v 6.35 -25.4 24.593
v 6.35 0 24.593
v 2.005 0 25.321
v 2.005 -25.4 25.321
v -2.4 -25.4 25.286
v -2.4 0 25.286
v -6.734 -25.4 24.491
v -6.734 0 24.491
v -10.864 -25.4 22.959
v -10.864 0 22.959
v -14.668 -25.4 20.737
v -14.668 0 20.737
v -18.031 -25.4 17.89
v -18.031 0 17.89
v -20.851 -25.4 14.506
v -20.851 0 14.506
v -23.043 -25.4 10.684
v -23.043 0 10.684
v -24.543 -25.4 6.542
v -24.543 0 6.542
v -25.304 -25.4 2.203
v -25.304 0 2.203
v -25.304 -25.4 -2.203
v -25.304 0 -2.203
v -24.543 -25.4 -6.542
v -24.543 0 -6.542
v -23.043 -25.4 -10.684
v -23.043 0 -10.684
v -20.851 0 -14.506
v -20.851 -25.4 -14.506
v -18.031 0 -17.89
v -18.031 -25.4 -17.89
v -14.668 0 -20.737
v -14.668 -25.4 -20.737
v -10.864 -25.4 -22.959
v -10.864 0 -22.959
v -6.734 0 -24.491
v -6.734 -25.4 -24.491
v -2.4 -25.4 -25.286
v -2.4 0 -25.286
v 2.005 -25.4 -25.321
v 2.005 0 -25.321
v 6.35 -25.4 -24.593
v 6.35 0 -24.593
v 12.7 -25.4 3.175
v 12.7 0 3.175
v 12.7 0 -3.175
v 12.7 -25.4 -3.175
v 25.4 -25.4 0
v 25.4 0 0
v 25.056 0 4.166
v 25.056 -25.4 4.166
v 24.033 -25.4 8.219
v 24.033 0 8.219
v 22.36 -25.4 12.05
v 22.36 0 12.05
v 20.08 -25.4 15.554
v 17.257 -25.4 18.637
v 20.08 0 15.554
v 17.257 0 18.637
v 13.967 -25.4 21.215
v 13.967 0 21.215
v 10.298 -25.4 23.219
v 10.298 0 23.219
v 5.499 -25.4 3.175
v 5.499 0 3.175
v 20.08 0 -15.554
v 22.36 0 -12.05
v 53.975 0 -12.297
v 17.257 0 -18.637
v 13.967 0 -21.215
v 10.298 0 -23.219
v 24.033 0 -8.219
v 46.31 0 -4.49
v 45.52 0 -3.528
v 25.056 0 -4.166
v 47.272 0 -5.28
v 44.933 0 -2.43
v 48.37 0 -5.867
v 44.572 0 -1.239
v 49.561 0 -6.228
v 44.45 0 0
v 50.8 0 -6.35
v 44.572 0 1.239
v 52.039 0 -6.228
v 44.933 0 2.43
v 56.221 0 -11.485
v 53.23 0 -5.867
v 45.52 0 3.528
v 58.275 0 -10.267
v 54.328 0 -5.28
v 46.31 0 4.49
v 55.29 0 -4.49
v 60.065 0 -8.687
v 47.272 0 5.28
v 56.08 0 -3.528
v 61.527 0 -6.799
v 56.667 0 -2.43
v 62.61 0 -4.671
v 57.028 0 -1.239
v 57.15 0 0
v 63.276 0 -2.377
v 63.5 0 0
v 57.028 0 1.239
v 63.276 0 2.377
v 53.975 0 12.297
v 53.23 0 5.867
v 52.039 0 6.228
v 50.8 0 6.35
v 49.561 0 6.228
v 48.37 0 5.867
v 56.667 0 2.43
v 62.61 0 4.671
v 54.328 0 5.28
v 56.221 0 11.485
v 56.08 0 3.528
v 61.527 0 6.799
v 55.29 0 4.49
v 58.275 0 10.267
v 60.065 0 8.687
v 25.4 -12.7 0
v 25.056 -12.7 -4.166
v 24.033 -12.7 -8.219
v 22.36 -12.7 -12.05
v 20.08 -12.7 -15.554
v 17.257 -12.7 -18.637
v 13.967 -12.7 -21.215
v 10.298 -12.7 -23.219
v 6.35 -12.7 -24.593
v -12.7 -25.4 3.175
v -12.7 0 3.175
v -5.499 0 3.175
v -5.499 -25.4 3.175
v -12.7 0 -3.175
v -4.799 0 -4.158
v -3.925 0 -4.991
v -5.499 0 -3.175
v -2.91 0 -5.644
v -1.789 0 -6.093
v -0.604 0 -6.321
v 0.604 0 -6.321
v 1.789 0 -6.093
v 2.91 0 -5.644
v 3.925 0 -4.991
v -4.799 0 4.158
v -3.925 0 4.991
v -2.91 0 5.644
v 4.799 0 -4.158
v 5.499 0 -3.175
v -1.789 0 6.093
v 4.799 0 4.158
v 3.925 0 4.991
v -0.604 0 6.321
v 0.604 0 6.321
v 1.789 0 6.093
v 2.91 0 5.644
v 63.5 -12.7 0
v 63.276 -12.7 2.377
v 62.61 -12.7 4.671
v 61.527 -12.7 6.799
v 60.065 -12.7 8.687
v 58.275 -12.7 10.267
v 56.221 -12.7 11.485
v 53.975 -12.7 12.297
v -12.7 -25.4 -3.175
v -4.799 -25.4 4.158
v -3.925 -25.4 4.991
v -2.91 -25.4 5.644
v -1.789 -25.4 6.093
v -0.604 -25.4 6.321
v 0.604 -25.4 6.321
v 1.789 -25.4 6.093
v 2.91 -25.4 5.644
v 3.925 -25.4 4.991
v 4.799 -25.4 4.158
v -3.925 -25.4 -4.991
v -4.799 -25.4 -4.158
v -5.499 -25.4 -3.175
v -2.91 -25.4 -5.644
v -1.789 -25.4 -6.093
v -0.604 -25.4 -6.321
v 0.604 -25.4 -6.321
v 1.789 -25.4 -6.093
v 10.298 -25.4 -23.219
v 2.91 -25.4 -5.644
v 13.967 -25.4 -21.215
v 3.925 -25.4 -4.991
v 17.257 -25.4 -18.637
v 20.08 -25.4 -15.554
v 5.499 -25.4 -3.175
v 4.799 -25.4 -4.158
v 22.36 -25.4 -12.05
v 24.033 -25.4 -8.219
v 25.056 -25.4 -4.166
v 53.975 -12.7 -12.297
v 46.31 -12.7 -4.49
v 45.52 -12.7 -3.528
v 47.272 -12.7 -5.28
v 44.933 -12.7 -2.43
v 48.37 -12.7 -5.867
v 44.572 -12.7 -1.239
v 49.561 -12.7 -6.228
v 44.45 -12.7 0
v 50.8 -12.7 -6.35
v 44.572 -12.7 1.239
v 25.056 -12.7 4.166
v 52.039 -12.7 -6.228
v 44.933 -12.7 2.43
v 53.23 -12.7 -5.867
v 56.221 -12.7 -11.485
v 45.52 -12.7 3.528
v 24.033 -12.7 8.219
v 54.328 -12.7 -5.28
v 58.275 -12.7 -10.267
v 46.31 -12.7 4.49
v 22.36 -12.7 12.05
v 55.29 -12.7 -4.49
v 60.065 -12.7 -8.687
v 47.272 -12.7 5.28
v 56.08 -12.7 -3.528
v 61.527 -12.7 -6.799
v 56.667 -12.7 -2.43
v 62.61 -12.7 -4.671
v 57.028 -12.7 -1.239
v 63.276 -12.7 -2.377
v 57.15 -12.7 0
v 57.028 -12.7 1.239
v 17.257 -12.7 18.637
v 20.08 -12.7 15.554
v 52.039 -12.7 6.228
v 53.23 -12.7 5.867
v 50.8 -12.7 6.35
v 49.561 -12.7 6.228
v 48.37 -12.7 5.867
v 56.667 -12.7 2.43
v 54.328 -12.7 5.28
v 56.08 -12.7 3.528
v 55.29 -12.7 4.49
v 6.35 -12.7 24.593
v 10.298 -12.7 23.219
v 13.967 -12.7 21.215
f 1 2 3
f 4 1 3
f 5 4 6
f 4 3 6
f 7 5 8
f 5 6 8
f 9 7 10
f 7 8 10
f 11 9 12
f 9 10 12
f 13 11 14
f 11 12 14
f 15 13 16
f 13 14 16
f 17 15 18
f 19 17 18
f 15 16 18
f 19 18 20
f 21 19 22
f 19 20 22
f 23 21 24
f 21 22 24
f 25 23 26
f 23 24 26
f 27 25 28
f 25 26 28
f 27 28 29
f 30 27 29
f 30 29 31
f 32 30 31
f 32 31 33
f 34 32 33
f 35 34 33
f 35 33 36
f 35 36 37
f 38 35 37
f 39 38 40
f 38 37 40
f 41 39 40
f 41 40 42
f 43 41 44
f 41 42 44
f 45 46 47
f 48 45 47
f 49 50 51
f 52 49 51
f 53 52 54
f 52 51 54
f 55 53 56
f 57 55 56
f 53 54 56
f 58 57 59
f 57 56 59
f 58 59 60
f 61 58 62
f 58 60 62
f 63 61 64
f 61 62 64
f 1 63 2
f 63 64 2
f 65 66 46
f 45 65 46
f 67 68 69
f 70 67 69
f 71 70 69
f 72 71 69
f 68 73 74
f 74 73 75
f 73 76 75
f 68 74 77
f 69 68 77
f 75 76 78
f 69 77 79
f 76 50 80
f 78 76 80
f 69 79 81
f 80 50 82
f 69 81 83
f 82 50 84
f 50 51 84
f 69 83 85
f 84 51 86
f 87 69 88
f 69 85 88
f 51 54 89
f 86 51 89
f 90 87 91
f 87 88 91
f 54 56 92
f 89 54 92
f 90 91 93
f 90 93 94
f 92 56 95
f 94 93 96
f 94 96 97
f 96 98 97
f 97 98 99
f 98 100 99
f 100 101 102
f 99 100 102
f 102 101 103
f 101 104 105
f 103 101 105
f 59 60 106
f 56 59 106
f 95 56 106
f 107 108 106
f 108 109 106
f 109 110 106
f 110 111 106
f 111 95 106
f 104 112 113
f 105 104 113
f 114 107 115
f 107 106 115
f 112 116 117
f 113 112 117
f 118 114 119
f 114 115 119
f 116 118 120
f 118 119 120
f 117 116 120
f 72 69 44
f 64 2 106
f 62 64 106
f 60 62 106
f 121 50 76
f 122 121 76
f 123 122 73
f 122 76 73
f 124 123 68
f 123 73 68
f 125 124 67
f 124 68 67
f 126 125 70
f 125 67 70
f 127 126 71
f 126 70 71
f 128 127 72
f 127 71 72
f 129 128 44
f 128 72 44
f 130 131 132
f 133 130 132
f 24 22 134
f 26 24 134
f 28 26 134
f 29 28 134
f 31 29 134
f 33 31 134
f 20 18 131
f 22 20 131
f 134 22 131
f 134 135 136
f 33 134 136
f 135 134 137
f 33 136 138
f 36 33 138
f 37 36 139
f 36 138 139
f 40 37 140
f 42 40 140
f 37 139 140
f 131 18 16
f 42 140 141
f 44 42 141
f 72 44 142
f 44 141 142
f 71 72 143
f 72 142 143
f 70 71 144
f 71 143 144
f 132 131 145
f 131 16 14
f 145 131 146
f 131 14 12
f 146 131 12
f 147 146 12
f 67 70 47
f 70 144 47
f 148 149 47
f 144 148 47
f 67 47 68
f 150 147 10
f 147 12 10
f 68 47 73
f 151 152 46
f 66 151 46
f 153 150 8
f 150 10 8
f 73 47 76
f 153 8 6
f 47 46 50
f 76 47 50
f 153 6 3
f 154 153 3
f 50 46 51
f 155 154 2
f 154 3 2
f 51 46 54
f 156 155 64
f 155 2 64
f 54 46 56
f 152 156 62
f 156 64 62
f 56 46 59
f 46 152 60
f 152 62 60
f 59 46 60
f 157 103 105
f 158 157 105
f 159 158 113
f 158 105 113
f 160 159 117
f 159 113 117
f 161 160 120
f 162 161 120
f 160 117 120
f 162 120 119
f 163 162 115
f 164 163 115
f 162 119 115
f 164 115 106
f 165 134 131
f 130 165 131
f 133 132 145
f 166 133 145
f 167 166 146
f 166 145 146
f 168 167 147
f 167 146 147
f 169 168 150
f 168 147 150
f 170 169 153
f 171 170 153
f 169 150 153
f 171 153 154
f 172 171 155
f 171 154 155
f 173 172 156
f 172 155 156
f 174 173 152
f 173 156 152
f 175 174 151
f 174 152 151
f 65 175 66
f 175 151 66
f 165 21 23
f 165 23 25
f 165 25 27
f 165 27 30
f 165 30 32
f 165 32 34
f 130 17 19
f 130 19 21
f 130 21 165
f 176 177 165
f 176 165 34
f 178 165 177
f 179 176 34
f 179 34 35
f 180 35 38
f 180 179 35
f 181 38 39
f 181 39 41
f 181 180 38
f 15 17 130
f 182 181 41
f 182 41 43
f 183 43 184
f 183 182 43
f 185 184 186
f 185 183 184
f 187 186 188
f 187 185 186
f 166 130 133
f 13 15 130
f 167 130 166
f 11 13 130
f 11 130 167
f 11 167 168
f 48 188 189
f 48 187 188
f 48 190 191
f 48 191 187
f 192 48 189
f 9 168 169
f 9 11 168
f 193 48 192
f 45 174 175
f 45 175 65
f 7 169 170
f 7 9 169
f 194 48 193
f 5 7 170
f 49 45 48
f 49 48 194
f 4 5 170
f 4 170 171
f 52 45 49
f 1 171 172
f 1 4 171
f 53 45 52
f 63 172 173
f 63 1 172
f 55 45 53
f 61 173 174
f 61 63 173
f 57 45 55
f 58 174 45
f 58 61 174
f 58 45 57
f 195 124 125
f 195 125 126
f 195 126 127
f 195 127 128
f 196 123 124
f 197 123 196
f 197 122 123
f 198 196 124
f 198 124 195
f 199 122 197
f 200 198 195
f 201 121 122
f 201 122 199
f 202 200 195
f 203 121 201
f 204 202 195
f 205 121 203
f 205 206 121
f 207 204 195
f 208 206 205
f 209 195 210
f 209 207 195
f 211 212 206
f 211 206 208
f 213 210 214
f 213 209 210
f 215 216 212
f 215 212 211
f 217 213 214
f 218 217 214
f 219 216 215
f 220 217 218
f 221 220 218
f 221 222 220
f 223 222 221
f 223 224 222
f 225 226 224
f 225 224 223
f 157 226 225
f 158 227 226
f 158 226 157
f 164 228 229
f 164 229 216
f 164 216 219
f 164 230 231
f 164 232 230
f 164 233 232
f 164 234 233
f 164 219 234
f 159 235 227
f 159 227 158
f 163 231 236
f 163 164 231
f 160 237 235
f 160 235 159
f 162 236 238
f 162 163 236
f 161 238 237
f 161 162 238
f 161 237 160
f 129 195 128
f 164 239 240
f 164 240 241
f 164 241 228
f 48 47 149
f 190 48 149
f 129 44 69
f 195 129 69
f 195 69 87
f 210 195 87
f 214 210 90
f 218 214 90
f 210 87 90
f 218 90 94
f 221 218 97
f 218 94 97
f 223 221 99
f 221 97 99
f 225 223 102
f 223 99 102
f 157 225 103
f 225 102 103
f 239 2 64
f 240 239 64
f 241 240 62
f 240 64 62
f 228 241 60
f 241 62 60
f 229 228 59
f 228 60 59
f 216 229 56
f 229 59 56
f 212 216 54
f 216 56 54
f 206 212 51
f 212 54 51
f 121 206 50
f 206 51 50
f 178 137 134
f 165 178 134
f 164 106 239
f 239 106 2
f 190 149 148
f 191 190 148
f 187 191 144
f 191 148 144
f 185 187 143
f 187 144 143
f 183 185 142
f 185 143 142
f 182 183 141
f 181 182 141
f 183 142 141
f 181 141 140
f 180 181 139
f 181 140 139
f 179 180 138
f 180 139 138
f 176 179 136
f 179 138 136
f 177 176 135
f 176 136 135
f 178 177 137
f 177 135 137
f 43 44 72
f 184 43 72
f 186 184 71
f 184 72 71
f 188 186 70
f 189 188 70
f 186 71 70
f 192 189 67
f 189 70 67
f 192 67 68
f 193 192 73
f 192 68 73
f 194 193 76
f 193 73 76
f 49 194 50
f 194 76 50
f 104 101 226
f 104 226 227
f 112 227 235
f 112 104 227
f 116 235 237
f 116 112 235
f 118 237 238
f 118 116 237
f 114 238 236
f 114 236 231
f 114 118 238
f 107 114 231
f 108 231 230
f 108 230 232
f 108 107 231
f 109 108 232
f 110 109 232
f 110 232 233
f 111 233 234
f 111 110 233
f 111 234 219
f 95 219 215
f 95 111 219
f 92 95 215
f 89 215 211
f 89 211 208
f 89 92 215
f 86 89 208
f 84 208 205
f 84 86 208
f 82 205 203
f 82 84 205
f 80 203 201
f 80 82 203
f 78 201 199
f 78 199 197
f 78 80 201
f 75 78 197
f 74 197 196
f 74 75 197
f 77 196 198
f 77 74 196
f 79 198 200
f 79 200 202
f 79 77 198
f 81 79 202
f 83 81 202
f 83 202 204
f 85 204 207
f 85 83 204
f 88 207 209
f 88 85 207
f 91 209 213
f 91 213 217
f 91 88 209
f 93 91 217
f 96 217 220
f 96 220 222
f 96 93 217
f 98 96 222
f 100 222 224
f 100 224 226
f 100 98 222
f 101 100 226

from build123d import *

# Parameters (mm, degrees)
F1_DEPTH = 25.4
F0_R     = 6.35
F2_DEPTH = 12.7


with BuildPart() as f1:
    # F0 (on Front) → F1 (new body)
    with BuildSketch(Plane.XZ):
        with BuildLine():
            ThreePointArc((6.35, -24.593444), (20.080463, -15.55426), (25.4, 0))
            ThreePointArc((25.4, 0), (20.080463, 15.55426), (6.35, 24.593444))
            ThreePointArc((6.35, 24.593444), (-25.4, 0), (6.35, -24.593444))
        make_face()
        with BuildLine():
            ThreePointArc((-5.499261, 3.175), (0, 6.35), (5.499261, 3.175))
            Line((5.499261, 3.175), (12.7, 3.175))
            Line((12.7, 3.175), (12.7, -3.175))
            Line((12.7, -3.175), (5.499261, -3.175))
            ThreePointArc((5.499261, -3.175), (0, -6.35), (-5.499261, -3.175))
            Line((-5.499261, -3.175), (-12.7, -3.175))
            Line((-12.7, -3.175), (-12.7, 3.175))
            Line((-12.7, 3.175), (-5.499261, 3.175))
        make_face(mode=Mode.SUBTRACT)
    extrude(amount=F1_DEPTH)


with BuildPart() as f2:
    # F0 (on Front) → F2 (new body)
    with BuildSketch(Plane.XZ):
        with BuildLine():
            ThreePointArc((6.35, 24.593444), (20.080463, 15.55426), (25.4, 0))
            ThreePointArc((25.4, 0), (20.080463, -15.55426), (6.35, -24.593444))
            Line((6.35, -24.593444), (53.975, -12.296722))
            ThreePointArc((53.975, -12.296722), (38.1, 0), (53.975, 12.296722))
            Line((53.975, 12.296722), (6.35, 24.593444))
        make_face()
        with BuildLine():
            ThreePointArc((63.5, 0), (60.840232, 7.77713), (53.975, 12.296722))
            ThreePointArc((53.975, 12.296722), (38.1, 0), (53.975, -12.296722))
            ThreePointArc((53.975, -12.296722), (60.840232, -7.77713), (63.5, 0))
        make_face()
        with Locations((50.8, 0)):
            Circle(F0_R, mode=Mode.SUBTRACT)
    extrude(amount=F2_DEPTH)


solid = Compound([f1.part, f2.part])
